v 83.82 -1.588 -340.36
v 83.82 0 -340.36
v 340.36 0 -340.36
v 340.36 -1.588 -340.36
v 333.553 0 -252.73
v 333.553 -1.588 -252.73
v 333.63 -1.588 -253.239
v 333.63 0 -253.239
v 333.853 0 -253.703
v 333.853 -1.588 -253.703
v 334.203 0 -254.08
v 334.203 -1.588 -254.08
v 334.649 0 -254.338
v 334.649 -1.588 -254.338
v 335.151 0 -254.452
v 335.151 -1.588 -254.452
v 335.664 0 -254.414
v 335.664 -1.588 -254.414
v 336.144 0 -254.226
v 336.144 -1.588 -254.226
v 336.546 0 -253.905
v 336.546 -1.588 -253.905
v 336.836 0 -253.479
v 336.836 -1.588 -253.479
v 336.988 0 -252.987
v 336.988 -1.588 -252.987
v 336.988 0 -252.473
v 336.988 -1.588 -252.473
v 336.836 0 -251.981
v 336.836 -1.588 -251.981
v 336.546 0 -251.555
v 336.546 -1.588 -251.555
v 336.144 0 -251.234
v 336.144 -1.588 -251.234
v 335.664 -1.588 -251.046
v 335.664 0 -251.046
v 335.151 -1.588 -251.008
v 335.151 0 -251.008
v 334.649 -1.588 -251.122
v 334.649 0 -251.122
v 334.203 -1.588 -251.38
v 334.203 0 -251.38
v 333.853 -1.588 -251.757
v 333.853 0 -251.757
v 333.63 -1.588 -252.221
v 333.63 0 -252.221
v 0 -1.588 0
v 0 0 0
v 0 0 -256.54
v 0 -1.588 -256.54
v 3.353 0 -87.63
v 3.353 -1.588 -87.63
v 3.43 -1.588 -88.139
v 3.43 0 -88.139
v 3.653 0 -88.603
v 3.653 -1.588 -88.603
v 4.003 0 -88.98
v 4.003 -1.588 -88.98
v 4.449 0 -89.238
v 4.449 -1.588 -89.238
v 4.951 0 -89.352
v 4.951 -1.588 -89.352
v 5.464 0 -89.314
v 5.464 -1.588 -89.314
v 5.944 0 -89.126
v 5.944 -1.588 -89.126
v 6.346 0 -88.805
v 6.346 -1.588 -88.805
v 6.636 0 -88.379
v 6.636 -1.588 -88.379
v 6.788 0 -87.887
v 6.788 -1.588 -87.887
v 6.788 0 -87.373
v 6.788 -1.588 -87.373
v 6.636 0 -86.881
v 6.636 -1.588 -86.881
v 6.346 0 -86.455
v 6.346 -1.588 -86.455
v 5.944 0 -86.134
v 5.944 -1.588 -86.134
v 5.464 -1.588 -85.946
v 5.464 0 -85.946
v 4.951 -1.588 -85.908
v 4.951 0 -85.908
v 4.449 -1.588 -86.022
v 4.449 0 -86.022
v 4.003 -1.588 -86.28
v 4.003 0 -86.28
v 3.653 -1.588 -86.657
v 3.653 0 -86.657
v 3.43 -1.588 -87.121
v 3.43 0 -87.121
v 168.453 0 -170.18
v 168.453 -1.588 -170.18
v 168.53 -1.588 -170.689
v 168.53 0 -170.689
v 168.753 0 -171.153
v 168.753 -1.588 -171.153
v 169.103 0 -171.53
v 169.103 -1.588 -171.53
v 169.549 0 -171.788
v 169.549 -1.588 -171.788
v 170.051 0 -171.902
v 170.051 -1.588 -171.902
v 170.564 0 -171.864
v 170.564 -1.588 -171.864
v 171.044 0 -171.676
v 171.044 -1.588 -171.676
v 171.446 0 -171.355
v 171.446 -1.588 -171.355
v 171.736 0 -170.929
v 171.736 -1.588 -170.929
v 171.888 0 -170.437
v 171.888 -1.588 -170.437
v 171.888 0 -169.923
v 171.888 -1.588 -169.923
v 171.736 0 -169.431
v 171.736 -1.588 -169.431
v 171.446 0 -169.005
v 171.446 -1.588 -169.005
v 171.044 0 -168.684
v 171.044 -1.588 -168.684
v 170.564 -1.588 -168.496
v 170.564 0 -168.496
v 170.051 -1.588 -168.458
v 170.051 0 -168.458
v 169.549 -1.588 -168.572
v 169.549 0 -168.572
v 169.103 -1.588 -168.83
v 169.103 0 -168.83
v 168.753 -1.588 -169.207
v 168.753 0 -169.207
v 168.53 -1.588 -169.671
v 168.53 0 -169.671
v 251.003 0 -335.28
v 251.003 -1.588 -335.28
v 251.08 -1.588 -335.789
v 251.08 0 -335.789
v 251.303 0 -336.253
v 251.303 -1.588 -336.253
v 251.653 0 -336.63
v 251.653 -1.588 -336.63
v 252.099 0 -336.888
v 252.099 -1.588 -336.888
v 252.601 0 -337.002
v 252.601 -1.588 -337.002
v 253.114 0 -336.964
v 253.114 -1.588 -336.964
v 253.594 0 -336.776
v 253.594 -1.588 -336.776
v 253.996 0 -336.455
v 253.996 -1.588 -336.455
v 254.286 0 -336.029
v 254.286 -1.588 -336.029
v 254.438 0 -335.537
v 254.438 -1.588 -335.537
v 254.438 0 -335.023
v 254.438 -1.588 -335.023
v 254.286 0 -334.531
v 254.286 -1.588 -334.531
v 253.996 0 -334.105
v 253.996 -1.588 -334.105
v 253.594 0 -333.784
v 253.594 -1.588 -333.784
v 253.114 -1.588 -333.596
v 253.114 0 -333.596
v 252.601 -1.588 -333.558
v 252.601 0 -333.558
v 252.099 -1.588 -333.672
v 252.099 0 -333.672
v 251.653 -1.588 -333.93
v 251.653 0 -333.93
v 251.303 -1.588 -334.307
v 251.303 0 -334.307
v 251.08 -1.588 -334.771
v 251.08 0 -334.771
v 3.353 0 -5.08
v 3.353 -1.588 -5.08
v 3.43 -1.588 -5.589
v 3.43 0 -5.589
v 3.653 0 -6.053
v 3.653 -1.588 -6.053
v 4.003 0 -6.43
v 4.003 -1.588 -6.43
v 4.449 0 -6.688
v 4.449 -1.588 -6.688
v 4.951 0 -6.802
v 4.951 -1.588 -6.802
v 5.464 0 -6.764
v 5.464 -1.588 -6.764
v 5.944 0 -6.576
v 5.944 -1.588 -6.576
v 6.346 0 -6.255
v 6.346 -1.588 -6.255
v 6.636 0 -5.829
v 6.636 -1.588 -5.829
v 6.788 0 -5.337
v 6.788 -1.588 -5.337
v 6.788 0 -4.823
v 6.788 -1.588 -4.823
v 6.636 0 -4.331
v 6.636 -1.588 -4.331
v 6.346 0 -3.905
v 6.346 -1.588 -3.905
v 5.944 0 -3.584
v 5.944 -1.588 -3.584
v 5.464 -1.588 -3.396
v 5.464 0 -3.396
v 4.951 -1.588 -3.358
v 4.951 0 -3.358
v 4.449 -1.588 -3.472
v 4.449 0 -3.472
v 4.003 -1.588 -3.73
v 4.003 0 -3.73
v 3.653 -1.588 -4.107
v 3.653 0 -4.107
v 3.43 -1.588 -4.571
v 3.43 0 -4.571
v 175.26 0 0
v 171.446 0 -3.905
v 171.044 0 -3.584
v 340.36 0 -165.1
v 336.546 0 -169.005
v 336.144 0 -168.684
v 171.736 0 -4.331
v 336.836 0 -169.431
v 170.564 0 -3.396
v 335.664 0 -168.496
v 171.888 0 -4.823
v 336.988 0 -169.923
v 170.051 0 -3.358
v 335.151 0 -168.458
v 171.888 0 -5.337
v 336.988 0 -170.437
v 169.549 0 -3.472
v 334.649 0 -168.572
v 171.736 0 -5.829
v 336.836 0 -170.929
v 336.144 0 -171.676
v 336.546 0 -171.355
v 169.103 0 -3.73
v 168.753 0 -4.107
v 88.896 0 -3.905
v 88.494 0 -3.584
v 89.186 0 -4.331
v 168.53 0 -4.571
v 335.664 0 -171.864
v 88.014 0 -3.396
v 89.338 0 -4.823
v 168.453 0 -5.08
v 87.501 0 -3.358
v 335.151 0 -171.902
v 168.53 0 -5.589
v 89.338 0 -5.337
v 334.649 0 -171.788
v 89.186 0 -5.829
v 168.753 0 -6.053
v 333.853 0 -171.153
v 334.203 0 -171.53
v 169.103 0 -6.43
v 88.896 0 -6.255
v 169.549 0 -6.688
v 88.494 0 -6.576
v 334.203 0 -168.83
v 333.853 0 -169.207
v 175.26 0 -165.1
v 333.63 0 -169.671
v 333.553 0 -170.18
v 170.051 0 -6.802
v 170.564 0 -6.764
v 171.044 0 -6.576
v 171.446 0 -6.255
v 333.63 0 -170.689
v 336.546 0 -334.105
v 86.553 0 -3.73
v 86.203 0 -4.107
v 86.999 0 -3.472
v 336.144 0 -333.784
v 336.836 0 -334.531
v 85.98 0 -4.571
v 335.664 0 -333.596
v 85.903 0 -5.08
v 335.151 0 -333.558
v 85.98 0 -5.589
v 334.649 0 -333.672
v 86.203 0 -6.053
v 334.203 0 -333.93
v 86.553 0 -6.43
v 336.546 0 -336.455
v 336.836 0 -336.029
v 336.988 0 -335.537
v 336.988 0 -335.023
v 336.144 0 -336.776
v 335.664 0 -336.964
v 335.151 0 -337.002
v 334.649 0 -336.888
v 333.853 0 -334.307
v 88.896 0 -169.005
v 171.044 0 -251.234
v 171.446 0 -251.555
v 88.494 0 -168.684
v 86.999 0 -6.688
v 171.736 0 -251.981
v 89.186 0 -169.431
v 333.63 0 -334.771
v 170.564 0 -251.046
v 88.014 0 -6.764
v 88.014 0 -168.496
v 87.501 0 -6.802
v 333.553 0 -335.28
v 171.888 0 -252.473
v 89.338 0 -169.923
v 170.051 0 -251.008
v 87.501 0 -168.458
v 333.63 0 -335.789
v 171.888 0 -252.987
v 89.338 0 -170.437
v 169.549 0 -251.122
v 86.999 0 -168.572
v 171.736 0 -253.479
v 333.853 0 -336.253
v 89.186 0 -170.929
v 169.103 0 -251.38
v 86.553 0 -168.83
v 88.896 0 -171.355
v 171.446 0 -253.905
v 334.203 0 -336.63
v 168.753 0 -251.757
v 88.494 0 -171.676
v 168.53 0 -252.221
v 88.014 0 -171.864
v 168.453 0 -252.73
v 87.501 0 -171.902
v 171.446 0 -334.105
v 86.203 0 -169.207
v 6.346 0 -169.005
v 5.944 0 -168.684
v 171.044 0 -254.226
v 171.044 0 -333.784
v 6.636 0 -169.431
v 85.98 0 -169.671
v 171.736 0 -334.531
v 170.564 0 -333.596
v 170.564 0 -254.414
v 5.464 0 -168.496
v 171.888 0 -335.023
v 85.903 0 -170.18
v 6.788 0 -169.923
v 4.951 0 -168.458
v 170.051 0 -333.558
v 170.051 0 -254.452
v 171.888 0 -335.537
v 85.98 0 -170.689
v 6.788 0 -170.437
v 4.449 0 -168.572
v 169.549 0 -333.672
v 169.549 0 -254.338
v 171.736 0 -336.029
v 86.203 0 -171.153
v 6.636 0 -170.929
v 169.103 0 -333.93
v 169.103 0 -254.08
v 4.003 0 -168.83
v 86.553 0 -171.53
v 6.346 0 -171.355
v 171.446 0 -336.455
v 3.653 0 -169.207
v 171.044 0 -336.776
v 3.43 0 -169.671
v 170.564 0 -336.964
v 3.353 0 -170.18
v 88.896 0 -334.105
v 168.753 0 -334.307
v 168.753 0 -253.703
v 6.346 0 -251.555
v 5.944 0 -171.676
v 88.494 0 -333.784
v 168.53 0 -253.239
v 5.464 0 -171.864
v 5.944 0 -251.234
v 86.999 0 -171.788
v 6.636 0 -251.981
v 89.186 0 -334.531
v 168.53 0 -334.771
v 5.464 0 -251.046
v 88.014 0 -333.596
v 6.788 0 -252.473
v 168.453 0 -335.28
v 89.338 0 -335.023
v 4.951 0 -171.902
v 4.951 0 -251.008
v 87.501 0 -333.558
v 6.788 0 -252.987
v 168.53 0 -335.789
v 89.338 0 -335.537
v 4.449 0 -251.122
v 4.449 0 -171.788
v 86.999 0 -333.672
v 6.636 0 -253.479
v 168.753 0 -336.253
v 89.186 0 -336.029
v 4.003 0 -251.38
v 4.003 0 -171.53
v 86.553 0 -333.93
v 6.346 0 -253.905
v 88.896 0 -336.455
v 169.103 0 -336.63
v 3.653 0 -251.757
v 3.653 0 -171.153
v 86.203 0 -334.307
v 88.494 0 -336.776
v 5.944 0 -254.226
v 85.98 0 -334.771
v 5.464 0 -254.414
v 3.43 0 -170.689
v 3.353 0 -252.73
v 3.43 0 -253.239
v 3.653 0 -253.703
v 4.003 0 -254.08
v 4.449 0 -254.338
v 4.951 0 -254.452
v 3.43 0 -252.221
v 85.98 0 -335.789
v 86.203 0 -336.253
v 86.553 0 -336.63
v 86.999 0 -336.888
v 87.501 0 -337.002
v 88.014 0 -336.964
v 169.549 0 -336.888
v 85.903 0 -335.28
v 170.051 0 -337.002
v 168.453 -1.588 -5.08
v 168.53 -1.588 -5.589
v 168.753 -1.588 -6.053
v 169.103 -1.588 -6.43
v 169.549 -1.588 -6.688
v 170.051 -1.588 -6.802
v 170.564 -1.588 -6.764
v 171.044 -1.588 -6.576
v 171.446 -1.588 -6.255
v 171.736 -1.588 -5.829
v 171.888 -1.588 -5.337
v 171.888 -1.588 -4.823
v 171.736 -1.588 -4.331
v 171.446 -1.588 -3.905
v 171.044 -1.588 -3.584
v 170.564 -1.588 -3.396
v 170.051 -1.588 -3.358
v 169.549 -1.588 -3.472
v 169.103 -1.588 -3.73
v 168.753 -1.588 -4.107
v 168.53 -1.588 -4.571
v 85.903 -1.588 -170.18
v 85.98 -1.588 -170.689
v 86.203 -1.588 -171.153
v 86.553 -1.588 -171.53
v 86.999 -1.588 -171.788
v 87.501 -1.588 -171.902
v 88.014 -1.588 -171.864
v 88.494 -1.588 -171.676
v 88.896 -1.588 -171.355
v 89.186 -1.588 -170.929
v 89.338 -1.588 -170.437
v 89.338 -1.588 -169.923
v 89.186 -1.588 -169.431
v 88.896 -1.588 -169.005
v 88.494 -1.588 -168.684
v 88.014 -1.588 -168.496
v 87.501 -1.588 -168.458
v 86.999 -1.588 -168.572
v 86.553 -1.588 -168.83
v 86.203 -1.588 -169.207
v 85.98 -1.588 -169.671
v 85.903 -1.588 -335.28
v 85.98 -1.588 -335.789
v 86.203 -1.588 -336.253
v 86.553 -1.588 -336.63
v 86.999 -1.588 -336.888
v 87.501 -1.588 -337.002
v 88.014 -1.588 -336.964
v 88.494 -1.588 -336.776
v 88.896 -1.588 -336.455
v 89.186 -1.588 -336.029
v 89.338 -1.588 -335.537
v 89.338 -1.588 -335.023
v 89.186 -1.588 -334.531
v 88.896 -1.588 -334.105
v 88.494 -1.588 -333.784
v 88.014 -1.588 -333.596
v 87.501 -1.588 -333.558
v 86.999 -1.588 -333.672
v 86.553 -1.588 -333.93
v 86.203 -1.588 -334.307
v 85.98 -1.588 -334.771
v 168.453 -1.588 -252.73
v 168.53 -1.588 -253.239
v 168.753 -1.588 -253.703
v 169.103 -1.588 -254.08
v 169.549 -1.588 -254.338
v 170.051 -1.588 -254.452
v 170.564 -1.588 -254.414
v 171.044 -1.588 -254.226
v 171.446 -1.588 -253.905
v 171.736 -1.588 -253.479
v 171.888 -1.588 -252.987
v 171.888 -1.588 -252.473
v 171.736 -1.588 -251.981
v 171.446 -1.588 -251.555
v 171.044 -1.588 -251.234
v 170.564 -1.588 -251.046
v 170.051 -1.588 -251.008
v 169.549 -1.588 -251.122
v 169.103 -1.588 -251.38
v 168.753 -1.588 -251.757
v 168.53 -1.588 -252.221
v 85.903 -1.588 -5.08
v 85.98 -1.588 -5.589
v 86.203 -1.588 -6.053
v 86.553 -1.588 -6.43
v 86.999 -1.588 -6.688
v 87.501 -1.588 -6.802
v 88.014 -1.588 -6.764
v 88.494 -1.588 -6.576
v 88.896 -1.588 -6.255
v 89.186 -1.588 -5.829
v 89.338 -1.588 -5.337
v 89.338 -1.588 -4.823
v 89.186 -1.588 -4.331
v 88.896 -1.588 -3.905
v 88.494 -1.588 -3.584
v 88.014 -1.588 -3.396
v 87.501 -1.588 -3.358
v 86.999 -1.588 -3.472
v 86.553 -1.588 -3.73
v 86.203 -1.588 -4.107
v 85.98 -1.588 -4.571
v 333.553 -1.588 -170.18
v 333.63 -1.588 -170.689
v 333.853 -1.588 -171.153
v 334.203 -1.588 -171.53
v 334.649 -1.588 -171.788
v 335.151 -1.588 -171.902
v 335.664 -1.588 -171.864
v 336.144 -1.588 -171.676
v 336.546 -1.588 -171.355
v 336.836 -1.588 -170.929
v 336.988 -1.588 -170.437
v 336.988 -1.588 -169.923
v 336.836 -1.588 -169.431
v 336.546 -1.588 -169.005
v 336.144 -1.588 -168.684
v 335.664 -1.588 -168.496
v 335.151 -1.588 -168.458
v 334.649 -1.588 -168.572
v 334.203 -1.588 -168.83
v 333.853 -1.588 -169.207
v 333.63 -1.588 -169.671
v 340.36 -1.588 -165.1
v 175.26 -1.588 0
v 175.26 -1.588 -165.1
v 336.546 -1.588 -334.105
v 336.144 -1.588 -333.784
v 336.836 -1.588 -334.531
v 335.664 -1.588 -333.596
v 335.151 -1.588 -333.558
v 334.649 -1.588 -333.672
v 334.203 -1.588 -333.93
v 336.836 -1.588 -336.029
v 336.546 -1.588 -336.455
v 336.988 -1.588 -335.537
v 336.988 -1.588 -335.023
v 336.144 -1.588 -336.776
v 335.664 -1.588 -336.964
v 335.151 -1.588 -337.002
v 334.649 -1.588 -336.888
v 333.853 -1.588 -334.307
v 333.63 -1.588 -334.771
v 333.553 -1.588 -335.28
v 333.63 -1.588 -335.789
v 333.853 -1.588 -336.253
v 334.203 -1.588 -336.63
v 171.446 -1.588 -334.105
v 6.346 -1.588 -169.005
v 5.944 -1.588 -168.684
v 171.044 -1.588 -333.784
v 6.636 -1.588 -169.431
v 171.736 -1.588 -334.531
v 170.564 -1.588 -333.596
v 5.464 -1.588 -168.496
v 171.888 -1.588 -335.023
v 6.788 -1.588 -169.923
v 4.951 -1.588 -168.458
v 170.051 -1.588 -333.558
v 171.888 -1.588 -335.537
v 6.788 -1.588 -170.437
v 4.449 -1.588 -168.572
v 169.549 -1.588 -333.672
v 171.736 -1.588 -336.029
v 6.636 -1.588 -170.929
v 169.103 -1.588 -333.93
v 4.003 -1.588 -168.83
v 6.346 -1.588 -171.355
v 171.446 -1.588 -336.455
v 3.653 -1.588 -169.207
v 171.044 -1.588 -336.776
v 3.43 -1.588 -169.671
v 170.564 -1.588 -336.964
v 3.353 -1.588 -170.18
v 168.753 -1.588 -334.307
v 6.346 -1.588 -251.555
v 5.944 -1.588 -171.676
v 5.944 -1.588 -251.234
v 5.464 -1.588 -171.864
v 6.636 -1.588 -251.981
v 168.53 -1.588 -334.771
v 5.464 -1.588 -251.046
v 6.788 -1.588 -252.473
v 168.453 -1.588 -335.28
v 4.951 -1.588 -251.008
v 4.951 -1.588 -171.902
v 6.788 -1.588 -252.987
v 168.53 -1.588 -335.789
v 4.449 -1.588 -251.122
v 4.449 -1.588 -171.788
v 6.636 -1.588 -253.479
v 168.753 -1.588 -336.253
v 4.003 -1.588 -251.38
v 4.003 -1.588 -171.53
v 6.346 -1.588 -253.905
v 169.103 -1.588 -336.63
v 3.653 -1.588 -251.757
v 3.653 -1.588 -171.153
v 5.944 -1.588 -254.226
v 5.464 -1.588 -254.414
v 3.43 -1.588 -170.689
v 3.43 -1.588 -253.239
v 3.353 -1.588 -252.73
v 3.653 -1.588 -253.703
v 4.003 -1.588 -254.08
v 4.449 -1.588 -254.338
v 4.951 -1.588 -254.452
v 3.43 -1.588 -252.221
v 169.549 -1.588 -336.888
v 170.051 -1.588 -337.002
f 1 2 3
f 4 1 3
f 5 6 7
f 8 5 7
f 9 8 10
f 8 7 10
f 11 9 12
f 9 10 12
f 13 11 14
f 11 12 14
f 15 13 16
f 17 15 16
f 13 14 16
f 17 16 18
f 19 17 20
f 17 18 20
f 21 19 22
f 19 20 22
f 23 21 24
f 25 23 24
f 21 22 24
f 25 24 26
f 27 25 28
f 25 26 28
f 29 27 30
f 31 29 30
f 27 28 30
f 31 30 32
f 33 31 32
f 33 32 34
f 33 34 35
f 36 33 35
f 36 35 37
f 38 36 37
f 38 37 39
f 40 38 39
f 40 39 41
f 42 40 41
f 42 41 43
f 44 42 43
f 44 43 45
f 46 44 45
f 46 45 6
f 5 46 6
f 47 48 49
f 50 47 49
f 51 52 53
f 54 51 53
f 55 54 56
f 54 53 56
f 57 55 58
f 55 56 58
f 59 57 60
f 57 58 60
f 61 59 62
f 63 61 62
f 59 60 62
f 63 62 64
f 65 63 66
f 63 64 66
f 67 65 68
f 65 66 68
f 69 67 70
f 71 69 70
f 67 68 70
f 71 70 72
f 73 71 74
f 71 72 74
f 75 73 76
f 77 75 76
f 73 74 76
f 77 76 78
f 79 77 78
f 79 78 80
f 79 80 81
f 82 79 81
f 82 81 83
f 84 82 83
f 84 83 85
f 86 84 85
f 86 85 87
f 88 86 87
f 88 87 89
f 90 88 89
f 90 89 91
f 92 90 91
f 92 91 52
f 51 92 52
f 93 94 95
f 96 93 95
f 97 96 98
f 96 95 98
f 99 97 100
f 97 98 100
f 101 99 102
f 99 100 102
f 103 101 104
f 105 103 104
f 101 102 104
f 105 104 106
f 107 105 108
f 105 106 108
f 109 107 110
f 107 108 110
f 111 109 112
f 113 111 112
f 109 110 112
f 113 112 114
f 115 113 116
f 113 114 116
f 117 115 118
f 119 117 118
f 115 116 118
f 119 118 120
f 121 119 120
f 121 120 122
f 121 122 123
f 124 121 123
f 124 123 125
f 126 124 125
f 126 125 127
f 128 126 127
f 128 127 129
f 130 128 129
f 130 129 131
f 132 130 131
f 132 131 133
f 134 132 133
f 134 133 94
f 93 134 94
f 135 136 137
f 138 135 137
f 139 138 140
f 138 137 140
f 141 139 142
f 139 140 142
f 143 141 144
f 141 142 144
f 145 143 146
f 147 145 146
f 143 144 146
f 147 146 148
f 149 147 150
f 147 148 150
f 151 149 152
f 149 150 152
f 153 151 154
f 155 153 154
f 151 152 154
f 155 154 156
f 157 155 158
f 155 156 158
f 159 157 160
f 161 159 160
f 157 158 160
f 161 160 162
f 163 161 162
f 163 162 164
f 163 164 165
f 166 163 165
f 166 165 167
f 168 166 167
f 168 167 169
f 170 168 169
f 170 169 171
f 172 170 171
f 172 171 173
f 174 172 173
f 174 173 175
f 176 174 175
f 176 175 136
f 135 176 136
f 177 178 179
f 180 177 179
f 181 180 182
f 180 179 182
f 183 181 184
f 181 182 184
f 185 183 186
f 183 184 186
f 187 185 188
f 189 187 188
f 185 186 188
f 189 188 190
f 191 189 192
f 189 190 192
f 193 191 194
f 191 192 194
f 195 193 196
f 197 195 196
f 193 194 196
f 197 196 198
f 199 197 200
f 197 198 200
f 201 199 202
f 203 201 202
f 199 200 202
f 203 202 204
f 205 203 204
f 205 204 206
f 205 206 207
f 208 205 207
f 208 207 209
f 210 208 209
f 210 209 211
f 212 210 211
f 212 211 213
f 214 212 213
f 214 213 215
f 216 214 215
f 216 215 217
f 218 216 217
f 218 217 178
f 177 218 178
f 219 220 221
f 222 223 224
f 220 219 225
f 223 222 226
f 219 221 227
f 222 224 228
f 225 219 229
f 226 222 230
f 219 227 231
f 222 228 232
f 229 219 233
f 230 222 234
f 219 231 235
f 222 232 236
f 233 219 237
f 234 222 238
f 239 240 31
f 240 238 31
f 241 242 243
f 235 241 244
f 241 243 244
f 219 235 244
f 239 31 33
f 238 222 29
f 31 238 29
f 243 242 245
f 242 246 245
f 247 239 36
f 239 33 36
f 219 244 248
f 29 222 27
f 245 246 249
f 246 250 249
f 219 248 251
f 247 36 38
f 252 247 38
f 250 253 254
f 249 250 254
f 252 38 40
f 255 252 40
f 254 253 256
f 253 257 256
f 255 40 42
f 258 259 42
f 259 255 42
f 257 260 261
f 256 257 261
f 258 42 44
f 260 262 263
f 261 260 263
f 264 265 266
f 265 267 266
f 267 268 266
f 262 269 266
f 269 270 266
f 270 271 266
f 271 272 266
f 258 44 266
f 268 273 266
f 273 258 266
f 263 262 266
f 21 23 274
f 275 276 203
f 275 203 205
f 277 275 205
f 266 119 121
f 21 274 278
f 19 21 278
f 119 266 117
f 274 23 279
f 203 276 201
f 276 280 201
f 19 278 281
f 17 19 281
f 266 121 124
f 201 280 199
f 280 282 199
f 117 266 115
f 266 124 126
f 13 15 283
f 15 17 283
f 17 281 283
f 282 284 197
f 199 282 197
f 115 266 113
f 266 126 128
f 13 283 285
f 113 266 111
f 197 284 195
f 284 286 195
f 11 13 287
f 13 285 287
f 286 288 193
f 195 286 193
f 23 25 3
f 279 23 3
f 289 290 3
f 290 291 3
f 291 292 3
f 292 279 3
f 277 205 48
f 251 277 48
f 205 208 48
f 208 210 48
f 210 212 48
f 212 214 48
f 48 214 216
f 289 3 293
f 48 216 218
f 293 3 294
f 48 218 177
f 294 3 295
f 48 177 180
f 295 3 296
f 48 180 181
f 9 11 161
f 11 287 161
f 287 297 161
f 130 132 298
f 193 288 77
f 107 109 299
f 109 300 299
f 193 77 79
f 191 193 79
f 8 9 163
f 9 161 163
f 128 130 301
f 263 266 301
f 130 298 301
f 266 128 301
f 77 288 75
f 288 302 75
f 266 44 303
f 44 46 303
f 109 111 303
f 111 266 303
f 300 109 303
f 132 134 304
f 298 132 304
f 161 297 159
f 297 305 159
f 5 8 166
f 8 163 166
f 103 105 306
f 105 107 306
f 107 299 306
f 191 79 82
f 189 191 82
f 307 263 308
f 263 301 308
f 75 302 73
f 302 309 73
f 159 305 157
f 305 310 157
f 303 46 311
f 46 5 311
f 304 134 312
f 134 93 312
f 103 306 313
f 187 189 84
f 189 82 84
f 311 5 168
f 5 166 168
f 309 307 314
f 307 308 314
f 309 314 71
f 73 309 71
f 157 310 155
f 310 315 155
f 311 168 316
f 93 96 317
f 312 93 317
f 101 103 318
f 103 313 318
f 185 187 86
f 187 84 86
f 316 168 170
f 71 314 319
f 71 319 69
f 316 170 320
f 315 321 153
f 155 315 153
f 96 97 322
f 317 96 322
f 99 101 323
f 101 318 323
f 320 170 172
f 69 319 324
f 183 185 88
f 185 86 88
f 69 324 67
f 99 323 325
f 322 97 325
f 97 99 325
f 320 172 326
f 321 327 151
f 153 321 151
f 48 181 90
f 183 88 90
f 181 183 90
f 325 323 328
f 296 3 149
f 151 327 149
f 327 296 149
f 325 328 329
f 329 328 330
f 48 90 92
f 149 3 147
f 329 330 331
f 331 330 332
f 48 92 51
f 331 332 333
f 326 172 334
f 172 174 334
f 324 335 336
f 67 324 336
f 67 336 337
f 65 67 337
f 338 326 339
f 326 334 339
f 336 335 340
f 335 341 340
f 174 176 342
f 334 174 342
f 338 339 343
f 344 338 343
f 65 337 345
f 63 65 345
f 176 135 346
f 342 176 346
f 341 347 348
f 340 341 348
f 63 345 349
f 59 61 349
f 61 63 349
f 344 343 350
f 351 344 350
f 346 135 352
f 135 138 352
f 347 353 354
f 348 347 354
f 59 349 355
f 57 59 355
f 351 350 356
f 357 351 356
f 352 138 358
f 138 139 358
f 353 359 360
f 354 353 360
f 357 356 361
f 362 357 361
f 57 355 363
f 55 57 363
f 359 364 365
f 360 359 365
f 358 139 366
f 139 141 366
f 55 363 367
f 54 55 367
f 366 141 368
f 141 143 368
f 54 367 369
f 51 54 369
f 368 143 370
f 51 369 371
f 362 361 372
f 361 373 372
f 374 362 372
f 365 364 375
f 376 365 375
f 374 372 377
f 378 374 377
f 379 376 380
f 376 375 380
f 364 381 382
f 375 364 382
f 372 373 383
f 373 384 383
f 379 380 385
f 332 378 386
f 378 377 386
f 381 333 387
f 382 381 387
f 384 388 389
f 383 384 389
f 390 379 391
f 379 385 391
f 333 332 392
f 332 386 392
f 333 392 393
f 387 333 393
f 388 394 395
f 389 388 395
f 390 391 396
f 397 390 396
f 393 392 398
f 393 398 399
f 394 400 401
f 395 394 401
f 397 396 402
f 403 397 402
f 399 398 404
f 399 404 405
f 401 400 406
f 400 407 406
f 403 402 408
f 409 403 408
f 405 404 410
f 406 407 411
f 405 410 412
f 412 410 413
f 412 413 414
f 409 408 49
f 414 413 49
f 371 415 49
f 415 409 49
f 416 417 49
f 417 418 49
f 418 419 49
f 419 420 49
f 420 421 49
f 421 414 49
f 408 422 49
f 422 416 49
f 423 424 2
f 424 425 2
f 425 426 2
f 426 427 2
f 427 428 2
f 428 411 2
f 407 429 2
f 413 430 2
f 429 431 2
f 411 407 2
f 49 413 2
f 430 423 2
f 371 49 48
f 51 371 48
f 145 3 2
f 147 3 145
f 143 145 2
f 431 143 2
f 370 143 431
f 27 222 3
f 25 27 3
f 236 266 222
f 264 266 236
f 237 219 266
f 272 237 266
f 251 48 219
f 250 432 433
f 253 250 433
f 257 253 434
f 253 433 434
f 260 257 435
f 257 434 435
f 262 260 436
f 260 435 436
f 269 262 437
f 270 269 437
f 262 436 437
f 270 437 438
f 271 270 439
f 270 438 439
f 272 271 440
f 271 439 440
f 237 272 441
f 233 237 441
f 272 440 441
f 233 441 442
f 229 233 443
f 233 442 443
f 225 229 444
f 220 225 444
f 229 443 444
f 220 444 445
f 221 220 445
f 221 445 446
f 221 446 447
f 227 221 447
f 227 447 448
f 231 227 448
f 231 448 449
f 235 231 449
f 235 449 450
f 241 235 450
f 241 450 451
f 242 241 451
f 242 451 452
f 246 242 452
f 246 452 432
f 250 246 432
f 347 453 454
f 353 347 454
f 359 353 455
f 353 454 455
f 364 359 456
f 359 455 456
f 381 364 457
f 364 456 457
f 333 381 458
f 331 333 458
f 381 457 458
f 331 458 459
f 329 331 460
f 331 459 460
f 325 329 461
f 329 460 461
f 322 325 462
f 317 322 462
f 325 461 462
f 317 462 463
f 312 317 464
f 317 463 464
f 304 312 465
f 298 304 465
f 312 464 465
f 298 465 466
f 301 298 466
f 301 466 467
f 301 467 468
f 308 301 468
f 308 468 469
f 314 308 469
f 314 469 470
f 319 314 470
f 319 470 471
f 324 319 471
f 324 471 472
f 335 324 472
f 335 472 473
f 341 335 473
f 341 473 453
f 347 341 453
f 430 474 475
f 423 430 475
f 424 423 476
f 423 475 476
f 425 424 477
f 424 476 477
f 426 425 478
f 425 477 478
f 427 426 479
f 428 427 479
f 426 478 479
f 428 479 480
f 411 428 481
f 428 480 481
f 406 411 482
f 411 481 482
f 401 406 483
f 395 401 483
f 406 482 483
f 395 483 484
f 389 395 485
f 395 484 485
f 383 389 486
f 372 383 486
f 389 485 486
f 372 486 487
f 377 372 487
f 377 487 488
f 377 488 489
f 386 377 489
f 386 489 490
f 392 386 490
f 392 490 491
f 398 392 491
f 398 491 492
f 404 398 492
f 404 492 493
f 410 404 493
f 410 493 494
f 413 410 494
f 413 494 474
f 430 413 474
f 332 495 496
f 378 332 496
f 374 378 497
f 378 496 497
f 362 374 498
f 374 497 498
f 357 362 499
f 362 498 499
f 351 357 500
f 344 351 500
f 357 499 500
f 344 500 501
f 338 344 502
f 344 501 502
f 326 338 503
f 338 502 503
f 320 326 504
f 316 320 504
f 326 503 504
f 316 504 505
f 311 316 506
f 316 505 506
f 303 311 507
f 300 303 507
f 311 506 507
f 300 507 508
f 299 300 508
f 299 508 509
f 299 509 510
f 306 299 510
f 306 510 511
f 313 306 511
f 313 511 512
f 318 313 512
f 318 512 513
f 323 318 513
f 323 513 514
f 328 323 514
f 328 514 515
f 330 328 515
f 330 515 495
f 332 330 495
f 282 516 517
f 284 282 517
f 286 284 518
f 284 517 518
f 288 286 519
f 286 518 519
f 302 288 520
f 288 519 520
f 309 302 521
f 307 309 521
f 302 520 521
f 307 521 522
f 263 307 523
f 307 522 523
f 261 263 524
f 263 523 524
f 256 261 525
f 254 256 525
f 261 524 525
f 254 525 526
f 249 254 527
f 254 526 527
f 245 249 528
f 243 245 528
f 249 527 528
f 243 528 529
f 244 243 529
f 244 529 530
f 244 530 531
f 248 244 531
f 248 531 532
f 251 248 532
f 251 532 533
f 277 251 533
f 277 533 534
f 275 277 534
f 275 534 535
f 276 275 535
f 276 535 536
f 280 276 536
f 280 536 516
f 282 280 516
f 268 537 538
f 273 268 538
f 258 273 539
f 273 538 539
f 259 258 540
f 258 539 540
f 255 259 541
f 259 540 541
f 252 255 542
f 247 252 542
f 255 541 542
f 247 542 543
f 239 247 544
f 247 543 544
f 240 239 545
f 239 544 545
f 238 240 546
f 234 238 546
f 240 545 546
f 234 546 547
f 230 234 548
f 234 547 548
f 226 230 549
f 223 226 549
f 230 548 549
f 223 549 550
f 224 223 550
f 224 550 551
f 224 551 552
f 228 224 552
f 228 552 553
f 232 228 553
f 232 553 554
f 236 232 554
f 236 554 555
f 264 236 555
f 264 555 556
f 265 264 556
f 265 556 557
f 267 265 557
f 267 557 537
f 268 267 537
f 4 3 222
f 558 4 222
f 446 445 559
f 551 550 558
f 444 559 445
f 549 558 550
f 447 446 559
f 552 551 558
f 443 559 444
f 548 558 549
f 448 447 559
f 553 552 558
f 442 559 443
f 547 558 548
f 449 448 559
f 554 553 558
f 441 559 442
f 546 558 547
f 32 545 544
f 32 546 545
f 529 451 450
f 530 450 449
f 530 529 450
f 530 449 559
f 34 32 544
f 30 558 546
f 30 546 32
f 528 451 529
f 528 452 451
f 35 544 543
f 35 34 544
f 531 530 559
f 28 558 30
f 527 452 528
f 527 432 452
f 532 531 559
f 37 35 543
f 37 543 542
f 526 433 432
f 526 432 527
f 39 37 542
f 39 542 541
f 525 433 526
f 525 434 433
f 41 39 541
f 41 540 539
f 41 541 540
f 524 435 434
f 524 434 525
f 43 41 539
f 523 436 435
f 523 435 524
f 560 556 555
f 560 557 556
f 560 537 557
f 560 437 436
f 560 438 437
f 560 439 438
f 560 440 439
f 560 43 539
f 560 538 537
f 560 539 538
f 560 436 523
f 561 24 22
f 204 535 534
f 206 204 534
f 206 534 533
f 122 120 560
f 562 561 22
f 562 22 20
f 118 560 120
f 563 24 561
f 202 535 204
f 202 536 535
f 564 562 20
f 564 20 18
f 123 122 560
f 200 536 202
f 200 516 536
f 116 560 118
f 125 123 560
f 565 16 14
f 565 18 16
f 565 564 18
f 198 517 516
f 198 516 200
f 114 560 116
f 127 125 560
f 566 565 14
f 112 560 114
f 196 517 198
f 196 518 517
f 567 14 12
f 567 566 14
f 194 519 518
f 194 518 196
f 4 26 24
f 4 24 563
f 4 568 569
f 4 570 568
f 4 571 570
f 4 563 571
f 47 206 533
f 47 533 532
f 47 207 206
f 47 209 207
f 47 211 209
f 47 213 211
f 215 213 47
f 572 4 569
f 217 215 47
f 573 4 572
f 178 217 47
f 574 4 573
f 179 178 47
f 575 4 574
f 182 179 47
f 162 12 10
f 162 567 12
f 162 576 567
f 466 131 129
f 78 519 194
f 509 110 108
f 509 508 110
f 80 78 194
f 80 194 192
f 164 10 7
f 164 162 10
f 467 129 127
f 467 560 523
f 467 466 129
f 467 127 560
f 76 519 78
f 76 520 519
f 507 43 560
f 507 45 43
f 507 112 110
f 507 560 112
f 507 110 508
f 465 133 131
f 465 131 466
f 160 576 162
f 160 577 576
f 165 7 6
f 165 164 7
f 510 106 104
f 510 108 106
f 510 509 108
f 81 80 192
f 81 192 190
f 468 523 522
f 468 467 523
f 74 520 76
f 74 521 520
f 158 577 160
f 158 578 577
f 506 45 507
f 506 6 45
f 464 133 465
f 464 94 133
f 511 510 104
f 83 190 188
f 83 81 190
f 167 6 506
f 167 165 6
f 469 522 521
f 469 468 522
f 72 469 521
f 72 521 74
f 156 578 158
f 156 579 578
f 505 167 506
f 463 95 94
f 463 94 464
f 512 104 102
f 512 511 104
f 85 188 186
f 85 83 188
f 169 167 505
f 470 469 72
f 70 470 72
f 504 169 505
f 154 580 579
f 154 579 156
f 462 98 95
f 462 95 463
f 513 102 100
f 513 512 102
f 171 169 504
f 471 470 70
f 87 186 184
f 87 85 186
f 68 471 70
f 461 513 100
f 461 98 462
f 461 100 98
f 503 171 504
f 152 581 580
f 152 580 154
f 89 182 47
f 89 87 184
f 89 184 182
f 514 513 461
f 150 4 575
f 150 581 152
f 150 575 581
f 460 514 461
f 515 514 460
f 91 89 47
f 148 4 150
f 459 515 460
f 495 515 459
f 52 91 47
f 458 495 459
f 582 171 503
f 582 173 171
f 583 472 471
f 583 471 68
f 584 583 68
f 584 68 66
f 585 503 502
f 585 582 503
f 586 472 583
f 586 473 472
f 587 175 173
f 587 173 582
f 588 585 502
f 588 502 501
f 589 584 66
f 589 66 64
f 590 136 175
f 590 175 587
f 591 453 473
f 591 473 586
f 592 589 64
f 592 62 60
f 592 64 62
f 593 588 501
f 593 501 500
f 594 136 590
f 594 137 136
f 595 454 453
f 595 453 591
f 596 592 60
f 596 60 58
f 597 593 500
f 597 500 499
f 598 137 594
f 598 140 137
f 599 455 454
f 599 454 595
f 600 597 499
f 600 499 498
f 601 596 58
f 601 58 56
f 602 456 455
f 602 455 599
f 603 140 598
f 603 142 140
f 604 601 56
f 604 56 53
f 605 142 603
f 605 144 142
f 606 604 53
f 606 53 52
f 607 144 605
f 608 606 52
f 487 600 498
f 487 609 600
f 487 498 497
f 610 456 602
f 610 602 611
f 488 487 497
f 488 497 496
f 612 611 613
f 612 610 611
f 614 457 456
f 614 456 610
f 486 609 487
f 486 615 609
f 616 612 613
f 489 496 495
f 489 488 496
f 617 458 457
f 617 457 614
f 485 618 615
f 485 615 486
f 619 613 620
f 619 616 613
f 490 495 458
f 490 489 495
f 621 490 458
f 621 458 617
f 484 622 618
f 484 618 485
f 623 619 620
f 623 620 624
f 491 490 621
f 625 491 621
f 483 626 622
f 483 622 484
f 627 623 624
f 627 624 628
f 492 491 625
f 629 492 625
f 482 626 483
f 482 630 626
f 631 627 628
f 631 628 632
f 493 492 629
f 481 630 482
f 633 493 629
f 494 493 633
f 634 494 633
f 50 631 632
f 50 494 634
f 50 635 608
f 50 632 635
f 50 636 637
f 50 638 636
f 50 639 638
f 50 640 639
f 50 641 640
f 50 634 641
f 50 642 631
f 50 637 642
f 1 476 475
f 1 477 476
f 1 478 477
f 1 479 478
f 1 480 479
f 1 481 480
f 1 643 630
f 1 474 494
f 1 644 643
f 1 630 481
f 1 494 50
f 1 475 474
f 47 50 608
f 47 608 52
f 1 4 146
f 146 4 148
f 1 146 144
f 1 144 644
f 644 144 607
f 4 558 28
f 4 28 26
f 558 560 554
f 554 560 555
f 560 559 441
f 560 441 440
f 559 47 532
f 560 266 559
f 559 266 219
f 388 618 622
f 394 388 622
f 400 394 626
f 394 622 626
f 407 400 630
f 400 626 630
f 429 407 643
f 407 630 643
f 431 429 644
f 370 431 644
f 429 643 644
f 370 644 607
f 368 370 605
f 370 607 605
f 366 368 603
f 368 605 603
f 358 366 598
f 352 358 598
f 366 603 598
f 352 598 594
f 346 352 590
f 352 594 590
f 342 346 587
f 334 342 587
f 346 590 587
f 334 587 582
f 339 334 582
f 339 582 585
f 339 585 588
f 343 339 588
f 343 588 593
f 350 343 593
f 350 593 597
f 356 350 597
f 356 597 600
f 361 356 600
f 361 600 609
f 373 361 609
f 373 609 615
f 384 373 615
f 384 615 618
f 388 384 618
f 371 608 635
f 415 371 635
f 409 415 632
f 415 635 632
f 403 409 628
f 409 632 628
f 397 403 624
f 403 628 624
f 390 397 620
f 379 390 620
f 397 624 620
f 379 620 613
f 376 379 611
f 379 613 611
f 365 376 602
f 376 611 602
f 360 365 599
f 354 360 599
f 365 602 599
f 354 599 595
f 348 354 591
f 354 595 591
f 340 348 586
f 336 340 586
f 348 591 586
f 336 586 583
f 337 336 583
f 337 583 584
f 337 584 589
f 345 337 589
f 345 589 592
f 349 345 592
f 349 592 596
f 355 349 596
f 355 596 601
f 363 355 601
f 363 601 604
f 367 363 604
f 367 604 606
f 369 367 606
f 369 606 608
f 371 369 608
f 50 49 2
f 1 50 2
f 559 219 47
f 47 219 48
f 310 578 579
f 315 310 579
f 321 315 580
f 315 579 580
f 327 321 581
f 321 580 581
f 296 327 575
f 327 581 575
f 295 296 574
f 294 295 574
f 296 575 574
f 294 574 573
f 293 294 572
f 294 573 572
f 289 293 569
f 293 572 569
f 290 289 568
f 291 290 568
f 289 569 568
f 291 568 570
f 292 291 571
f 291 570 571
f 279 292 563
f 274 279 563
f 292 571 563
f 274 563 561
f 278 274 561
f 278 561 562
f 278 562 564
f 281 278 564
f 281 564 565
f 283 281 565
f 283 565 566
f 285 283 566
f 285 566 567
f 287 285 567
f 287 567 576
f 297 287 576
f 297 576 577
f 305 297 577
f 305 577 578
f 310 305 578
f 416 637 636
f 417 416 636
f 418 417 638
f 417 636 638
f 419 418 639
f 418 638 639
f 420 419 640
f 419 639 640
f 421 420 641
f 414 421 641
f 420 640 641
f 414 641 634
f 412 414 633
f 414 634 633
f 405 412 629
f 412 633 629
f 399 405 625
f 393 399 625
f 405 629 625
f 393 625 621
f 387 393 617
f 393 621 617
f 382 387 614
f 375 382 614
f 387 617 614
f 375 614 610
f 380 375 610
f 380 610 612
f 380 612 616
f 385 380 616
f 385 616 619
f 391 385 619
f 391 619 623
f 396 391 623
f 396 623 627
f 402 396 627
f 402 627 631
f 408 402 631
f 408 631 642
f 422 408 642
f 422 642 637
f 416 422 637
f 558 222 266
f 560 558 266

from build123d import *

# Parameters (mm, degrees)
BASE_FLANGE1_DEPTH              = 1.5875
F_29_0_136_DIAMETER_HOLE1_D     = 3.4544
F_29_0_136_DIAMETER_HOLE1_DEPTH = 6.35
F_29_0_136_DIAMETER_HOLE1_TIP   = 1.037806461


# Sheet-metal steps are written as plain solids
with BuildPart() as part:
    # Sketch1 → Base-Flange1 (new body)
    with BuildSketch(Plane(origin=(0, 0, 0), x_dir=(1, 0, 0), z_dir=(0, 1, 0))):
        Polygon((0, 0), (0, 256.54), (83.82, 340.36), (340.36, 340.36), (340.36, 165.1), (175.26, 165.1), (175.26, 0), align=None)
    extrude(amount=-BASE_FLANGE1_DEPTH)

    # #29 (0.136) Diameter Hole1
    with Locations(Plane(origin=(0, 0, 0), x_dir=(1, 0, 0), z_dir=(0, 1, 0))):
        with Locations((5.08, 5.08), (335.28, 170.18), (87.63, 5.08), (170.18, 5.08), (5.08, 87.63), (5.08, 170.18), (5.08, 252.73), (335.28, 252.73), (335.28, 335.28), (252.73, 335.28), (170.18, 335.28), (87.63, 335.28), (170.18, 170.18), (87.63, 170.18), (170.18, 252.73)):
            Hole(F_29_0_136_DIAMETER_HOLE1_D / 2, depth=F_29_0_136_DIAMETER_HOLE1_DEPTH)
            with Locations((0, 0, -(F_29_0_136_DIAMETER_HOLE1_DEPTH + F_29_0_136_DIAMETER_HOLE1_TIP / 2))):  # 118° drill point
                Cone(0, F_29_0_136_DIAMETER_HOLE1_D / 2, F_29_0_136_DIAMETER_HOLE1_TIP, mode=Mode.SUBTRACT)


solid = part.part
